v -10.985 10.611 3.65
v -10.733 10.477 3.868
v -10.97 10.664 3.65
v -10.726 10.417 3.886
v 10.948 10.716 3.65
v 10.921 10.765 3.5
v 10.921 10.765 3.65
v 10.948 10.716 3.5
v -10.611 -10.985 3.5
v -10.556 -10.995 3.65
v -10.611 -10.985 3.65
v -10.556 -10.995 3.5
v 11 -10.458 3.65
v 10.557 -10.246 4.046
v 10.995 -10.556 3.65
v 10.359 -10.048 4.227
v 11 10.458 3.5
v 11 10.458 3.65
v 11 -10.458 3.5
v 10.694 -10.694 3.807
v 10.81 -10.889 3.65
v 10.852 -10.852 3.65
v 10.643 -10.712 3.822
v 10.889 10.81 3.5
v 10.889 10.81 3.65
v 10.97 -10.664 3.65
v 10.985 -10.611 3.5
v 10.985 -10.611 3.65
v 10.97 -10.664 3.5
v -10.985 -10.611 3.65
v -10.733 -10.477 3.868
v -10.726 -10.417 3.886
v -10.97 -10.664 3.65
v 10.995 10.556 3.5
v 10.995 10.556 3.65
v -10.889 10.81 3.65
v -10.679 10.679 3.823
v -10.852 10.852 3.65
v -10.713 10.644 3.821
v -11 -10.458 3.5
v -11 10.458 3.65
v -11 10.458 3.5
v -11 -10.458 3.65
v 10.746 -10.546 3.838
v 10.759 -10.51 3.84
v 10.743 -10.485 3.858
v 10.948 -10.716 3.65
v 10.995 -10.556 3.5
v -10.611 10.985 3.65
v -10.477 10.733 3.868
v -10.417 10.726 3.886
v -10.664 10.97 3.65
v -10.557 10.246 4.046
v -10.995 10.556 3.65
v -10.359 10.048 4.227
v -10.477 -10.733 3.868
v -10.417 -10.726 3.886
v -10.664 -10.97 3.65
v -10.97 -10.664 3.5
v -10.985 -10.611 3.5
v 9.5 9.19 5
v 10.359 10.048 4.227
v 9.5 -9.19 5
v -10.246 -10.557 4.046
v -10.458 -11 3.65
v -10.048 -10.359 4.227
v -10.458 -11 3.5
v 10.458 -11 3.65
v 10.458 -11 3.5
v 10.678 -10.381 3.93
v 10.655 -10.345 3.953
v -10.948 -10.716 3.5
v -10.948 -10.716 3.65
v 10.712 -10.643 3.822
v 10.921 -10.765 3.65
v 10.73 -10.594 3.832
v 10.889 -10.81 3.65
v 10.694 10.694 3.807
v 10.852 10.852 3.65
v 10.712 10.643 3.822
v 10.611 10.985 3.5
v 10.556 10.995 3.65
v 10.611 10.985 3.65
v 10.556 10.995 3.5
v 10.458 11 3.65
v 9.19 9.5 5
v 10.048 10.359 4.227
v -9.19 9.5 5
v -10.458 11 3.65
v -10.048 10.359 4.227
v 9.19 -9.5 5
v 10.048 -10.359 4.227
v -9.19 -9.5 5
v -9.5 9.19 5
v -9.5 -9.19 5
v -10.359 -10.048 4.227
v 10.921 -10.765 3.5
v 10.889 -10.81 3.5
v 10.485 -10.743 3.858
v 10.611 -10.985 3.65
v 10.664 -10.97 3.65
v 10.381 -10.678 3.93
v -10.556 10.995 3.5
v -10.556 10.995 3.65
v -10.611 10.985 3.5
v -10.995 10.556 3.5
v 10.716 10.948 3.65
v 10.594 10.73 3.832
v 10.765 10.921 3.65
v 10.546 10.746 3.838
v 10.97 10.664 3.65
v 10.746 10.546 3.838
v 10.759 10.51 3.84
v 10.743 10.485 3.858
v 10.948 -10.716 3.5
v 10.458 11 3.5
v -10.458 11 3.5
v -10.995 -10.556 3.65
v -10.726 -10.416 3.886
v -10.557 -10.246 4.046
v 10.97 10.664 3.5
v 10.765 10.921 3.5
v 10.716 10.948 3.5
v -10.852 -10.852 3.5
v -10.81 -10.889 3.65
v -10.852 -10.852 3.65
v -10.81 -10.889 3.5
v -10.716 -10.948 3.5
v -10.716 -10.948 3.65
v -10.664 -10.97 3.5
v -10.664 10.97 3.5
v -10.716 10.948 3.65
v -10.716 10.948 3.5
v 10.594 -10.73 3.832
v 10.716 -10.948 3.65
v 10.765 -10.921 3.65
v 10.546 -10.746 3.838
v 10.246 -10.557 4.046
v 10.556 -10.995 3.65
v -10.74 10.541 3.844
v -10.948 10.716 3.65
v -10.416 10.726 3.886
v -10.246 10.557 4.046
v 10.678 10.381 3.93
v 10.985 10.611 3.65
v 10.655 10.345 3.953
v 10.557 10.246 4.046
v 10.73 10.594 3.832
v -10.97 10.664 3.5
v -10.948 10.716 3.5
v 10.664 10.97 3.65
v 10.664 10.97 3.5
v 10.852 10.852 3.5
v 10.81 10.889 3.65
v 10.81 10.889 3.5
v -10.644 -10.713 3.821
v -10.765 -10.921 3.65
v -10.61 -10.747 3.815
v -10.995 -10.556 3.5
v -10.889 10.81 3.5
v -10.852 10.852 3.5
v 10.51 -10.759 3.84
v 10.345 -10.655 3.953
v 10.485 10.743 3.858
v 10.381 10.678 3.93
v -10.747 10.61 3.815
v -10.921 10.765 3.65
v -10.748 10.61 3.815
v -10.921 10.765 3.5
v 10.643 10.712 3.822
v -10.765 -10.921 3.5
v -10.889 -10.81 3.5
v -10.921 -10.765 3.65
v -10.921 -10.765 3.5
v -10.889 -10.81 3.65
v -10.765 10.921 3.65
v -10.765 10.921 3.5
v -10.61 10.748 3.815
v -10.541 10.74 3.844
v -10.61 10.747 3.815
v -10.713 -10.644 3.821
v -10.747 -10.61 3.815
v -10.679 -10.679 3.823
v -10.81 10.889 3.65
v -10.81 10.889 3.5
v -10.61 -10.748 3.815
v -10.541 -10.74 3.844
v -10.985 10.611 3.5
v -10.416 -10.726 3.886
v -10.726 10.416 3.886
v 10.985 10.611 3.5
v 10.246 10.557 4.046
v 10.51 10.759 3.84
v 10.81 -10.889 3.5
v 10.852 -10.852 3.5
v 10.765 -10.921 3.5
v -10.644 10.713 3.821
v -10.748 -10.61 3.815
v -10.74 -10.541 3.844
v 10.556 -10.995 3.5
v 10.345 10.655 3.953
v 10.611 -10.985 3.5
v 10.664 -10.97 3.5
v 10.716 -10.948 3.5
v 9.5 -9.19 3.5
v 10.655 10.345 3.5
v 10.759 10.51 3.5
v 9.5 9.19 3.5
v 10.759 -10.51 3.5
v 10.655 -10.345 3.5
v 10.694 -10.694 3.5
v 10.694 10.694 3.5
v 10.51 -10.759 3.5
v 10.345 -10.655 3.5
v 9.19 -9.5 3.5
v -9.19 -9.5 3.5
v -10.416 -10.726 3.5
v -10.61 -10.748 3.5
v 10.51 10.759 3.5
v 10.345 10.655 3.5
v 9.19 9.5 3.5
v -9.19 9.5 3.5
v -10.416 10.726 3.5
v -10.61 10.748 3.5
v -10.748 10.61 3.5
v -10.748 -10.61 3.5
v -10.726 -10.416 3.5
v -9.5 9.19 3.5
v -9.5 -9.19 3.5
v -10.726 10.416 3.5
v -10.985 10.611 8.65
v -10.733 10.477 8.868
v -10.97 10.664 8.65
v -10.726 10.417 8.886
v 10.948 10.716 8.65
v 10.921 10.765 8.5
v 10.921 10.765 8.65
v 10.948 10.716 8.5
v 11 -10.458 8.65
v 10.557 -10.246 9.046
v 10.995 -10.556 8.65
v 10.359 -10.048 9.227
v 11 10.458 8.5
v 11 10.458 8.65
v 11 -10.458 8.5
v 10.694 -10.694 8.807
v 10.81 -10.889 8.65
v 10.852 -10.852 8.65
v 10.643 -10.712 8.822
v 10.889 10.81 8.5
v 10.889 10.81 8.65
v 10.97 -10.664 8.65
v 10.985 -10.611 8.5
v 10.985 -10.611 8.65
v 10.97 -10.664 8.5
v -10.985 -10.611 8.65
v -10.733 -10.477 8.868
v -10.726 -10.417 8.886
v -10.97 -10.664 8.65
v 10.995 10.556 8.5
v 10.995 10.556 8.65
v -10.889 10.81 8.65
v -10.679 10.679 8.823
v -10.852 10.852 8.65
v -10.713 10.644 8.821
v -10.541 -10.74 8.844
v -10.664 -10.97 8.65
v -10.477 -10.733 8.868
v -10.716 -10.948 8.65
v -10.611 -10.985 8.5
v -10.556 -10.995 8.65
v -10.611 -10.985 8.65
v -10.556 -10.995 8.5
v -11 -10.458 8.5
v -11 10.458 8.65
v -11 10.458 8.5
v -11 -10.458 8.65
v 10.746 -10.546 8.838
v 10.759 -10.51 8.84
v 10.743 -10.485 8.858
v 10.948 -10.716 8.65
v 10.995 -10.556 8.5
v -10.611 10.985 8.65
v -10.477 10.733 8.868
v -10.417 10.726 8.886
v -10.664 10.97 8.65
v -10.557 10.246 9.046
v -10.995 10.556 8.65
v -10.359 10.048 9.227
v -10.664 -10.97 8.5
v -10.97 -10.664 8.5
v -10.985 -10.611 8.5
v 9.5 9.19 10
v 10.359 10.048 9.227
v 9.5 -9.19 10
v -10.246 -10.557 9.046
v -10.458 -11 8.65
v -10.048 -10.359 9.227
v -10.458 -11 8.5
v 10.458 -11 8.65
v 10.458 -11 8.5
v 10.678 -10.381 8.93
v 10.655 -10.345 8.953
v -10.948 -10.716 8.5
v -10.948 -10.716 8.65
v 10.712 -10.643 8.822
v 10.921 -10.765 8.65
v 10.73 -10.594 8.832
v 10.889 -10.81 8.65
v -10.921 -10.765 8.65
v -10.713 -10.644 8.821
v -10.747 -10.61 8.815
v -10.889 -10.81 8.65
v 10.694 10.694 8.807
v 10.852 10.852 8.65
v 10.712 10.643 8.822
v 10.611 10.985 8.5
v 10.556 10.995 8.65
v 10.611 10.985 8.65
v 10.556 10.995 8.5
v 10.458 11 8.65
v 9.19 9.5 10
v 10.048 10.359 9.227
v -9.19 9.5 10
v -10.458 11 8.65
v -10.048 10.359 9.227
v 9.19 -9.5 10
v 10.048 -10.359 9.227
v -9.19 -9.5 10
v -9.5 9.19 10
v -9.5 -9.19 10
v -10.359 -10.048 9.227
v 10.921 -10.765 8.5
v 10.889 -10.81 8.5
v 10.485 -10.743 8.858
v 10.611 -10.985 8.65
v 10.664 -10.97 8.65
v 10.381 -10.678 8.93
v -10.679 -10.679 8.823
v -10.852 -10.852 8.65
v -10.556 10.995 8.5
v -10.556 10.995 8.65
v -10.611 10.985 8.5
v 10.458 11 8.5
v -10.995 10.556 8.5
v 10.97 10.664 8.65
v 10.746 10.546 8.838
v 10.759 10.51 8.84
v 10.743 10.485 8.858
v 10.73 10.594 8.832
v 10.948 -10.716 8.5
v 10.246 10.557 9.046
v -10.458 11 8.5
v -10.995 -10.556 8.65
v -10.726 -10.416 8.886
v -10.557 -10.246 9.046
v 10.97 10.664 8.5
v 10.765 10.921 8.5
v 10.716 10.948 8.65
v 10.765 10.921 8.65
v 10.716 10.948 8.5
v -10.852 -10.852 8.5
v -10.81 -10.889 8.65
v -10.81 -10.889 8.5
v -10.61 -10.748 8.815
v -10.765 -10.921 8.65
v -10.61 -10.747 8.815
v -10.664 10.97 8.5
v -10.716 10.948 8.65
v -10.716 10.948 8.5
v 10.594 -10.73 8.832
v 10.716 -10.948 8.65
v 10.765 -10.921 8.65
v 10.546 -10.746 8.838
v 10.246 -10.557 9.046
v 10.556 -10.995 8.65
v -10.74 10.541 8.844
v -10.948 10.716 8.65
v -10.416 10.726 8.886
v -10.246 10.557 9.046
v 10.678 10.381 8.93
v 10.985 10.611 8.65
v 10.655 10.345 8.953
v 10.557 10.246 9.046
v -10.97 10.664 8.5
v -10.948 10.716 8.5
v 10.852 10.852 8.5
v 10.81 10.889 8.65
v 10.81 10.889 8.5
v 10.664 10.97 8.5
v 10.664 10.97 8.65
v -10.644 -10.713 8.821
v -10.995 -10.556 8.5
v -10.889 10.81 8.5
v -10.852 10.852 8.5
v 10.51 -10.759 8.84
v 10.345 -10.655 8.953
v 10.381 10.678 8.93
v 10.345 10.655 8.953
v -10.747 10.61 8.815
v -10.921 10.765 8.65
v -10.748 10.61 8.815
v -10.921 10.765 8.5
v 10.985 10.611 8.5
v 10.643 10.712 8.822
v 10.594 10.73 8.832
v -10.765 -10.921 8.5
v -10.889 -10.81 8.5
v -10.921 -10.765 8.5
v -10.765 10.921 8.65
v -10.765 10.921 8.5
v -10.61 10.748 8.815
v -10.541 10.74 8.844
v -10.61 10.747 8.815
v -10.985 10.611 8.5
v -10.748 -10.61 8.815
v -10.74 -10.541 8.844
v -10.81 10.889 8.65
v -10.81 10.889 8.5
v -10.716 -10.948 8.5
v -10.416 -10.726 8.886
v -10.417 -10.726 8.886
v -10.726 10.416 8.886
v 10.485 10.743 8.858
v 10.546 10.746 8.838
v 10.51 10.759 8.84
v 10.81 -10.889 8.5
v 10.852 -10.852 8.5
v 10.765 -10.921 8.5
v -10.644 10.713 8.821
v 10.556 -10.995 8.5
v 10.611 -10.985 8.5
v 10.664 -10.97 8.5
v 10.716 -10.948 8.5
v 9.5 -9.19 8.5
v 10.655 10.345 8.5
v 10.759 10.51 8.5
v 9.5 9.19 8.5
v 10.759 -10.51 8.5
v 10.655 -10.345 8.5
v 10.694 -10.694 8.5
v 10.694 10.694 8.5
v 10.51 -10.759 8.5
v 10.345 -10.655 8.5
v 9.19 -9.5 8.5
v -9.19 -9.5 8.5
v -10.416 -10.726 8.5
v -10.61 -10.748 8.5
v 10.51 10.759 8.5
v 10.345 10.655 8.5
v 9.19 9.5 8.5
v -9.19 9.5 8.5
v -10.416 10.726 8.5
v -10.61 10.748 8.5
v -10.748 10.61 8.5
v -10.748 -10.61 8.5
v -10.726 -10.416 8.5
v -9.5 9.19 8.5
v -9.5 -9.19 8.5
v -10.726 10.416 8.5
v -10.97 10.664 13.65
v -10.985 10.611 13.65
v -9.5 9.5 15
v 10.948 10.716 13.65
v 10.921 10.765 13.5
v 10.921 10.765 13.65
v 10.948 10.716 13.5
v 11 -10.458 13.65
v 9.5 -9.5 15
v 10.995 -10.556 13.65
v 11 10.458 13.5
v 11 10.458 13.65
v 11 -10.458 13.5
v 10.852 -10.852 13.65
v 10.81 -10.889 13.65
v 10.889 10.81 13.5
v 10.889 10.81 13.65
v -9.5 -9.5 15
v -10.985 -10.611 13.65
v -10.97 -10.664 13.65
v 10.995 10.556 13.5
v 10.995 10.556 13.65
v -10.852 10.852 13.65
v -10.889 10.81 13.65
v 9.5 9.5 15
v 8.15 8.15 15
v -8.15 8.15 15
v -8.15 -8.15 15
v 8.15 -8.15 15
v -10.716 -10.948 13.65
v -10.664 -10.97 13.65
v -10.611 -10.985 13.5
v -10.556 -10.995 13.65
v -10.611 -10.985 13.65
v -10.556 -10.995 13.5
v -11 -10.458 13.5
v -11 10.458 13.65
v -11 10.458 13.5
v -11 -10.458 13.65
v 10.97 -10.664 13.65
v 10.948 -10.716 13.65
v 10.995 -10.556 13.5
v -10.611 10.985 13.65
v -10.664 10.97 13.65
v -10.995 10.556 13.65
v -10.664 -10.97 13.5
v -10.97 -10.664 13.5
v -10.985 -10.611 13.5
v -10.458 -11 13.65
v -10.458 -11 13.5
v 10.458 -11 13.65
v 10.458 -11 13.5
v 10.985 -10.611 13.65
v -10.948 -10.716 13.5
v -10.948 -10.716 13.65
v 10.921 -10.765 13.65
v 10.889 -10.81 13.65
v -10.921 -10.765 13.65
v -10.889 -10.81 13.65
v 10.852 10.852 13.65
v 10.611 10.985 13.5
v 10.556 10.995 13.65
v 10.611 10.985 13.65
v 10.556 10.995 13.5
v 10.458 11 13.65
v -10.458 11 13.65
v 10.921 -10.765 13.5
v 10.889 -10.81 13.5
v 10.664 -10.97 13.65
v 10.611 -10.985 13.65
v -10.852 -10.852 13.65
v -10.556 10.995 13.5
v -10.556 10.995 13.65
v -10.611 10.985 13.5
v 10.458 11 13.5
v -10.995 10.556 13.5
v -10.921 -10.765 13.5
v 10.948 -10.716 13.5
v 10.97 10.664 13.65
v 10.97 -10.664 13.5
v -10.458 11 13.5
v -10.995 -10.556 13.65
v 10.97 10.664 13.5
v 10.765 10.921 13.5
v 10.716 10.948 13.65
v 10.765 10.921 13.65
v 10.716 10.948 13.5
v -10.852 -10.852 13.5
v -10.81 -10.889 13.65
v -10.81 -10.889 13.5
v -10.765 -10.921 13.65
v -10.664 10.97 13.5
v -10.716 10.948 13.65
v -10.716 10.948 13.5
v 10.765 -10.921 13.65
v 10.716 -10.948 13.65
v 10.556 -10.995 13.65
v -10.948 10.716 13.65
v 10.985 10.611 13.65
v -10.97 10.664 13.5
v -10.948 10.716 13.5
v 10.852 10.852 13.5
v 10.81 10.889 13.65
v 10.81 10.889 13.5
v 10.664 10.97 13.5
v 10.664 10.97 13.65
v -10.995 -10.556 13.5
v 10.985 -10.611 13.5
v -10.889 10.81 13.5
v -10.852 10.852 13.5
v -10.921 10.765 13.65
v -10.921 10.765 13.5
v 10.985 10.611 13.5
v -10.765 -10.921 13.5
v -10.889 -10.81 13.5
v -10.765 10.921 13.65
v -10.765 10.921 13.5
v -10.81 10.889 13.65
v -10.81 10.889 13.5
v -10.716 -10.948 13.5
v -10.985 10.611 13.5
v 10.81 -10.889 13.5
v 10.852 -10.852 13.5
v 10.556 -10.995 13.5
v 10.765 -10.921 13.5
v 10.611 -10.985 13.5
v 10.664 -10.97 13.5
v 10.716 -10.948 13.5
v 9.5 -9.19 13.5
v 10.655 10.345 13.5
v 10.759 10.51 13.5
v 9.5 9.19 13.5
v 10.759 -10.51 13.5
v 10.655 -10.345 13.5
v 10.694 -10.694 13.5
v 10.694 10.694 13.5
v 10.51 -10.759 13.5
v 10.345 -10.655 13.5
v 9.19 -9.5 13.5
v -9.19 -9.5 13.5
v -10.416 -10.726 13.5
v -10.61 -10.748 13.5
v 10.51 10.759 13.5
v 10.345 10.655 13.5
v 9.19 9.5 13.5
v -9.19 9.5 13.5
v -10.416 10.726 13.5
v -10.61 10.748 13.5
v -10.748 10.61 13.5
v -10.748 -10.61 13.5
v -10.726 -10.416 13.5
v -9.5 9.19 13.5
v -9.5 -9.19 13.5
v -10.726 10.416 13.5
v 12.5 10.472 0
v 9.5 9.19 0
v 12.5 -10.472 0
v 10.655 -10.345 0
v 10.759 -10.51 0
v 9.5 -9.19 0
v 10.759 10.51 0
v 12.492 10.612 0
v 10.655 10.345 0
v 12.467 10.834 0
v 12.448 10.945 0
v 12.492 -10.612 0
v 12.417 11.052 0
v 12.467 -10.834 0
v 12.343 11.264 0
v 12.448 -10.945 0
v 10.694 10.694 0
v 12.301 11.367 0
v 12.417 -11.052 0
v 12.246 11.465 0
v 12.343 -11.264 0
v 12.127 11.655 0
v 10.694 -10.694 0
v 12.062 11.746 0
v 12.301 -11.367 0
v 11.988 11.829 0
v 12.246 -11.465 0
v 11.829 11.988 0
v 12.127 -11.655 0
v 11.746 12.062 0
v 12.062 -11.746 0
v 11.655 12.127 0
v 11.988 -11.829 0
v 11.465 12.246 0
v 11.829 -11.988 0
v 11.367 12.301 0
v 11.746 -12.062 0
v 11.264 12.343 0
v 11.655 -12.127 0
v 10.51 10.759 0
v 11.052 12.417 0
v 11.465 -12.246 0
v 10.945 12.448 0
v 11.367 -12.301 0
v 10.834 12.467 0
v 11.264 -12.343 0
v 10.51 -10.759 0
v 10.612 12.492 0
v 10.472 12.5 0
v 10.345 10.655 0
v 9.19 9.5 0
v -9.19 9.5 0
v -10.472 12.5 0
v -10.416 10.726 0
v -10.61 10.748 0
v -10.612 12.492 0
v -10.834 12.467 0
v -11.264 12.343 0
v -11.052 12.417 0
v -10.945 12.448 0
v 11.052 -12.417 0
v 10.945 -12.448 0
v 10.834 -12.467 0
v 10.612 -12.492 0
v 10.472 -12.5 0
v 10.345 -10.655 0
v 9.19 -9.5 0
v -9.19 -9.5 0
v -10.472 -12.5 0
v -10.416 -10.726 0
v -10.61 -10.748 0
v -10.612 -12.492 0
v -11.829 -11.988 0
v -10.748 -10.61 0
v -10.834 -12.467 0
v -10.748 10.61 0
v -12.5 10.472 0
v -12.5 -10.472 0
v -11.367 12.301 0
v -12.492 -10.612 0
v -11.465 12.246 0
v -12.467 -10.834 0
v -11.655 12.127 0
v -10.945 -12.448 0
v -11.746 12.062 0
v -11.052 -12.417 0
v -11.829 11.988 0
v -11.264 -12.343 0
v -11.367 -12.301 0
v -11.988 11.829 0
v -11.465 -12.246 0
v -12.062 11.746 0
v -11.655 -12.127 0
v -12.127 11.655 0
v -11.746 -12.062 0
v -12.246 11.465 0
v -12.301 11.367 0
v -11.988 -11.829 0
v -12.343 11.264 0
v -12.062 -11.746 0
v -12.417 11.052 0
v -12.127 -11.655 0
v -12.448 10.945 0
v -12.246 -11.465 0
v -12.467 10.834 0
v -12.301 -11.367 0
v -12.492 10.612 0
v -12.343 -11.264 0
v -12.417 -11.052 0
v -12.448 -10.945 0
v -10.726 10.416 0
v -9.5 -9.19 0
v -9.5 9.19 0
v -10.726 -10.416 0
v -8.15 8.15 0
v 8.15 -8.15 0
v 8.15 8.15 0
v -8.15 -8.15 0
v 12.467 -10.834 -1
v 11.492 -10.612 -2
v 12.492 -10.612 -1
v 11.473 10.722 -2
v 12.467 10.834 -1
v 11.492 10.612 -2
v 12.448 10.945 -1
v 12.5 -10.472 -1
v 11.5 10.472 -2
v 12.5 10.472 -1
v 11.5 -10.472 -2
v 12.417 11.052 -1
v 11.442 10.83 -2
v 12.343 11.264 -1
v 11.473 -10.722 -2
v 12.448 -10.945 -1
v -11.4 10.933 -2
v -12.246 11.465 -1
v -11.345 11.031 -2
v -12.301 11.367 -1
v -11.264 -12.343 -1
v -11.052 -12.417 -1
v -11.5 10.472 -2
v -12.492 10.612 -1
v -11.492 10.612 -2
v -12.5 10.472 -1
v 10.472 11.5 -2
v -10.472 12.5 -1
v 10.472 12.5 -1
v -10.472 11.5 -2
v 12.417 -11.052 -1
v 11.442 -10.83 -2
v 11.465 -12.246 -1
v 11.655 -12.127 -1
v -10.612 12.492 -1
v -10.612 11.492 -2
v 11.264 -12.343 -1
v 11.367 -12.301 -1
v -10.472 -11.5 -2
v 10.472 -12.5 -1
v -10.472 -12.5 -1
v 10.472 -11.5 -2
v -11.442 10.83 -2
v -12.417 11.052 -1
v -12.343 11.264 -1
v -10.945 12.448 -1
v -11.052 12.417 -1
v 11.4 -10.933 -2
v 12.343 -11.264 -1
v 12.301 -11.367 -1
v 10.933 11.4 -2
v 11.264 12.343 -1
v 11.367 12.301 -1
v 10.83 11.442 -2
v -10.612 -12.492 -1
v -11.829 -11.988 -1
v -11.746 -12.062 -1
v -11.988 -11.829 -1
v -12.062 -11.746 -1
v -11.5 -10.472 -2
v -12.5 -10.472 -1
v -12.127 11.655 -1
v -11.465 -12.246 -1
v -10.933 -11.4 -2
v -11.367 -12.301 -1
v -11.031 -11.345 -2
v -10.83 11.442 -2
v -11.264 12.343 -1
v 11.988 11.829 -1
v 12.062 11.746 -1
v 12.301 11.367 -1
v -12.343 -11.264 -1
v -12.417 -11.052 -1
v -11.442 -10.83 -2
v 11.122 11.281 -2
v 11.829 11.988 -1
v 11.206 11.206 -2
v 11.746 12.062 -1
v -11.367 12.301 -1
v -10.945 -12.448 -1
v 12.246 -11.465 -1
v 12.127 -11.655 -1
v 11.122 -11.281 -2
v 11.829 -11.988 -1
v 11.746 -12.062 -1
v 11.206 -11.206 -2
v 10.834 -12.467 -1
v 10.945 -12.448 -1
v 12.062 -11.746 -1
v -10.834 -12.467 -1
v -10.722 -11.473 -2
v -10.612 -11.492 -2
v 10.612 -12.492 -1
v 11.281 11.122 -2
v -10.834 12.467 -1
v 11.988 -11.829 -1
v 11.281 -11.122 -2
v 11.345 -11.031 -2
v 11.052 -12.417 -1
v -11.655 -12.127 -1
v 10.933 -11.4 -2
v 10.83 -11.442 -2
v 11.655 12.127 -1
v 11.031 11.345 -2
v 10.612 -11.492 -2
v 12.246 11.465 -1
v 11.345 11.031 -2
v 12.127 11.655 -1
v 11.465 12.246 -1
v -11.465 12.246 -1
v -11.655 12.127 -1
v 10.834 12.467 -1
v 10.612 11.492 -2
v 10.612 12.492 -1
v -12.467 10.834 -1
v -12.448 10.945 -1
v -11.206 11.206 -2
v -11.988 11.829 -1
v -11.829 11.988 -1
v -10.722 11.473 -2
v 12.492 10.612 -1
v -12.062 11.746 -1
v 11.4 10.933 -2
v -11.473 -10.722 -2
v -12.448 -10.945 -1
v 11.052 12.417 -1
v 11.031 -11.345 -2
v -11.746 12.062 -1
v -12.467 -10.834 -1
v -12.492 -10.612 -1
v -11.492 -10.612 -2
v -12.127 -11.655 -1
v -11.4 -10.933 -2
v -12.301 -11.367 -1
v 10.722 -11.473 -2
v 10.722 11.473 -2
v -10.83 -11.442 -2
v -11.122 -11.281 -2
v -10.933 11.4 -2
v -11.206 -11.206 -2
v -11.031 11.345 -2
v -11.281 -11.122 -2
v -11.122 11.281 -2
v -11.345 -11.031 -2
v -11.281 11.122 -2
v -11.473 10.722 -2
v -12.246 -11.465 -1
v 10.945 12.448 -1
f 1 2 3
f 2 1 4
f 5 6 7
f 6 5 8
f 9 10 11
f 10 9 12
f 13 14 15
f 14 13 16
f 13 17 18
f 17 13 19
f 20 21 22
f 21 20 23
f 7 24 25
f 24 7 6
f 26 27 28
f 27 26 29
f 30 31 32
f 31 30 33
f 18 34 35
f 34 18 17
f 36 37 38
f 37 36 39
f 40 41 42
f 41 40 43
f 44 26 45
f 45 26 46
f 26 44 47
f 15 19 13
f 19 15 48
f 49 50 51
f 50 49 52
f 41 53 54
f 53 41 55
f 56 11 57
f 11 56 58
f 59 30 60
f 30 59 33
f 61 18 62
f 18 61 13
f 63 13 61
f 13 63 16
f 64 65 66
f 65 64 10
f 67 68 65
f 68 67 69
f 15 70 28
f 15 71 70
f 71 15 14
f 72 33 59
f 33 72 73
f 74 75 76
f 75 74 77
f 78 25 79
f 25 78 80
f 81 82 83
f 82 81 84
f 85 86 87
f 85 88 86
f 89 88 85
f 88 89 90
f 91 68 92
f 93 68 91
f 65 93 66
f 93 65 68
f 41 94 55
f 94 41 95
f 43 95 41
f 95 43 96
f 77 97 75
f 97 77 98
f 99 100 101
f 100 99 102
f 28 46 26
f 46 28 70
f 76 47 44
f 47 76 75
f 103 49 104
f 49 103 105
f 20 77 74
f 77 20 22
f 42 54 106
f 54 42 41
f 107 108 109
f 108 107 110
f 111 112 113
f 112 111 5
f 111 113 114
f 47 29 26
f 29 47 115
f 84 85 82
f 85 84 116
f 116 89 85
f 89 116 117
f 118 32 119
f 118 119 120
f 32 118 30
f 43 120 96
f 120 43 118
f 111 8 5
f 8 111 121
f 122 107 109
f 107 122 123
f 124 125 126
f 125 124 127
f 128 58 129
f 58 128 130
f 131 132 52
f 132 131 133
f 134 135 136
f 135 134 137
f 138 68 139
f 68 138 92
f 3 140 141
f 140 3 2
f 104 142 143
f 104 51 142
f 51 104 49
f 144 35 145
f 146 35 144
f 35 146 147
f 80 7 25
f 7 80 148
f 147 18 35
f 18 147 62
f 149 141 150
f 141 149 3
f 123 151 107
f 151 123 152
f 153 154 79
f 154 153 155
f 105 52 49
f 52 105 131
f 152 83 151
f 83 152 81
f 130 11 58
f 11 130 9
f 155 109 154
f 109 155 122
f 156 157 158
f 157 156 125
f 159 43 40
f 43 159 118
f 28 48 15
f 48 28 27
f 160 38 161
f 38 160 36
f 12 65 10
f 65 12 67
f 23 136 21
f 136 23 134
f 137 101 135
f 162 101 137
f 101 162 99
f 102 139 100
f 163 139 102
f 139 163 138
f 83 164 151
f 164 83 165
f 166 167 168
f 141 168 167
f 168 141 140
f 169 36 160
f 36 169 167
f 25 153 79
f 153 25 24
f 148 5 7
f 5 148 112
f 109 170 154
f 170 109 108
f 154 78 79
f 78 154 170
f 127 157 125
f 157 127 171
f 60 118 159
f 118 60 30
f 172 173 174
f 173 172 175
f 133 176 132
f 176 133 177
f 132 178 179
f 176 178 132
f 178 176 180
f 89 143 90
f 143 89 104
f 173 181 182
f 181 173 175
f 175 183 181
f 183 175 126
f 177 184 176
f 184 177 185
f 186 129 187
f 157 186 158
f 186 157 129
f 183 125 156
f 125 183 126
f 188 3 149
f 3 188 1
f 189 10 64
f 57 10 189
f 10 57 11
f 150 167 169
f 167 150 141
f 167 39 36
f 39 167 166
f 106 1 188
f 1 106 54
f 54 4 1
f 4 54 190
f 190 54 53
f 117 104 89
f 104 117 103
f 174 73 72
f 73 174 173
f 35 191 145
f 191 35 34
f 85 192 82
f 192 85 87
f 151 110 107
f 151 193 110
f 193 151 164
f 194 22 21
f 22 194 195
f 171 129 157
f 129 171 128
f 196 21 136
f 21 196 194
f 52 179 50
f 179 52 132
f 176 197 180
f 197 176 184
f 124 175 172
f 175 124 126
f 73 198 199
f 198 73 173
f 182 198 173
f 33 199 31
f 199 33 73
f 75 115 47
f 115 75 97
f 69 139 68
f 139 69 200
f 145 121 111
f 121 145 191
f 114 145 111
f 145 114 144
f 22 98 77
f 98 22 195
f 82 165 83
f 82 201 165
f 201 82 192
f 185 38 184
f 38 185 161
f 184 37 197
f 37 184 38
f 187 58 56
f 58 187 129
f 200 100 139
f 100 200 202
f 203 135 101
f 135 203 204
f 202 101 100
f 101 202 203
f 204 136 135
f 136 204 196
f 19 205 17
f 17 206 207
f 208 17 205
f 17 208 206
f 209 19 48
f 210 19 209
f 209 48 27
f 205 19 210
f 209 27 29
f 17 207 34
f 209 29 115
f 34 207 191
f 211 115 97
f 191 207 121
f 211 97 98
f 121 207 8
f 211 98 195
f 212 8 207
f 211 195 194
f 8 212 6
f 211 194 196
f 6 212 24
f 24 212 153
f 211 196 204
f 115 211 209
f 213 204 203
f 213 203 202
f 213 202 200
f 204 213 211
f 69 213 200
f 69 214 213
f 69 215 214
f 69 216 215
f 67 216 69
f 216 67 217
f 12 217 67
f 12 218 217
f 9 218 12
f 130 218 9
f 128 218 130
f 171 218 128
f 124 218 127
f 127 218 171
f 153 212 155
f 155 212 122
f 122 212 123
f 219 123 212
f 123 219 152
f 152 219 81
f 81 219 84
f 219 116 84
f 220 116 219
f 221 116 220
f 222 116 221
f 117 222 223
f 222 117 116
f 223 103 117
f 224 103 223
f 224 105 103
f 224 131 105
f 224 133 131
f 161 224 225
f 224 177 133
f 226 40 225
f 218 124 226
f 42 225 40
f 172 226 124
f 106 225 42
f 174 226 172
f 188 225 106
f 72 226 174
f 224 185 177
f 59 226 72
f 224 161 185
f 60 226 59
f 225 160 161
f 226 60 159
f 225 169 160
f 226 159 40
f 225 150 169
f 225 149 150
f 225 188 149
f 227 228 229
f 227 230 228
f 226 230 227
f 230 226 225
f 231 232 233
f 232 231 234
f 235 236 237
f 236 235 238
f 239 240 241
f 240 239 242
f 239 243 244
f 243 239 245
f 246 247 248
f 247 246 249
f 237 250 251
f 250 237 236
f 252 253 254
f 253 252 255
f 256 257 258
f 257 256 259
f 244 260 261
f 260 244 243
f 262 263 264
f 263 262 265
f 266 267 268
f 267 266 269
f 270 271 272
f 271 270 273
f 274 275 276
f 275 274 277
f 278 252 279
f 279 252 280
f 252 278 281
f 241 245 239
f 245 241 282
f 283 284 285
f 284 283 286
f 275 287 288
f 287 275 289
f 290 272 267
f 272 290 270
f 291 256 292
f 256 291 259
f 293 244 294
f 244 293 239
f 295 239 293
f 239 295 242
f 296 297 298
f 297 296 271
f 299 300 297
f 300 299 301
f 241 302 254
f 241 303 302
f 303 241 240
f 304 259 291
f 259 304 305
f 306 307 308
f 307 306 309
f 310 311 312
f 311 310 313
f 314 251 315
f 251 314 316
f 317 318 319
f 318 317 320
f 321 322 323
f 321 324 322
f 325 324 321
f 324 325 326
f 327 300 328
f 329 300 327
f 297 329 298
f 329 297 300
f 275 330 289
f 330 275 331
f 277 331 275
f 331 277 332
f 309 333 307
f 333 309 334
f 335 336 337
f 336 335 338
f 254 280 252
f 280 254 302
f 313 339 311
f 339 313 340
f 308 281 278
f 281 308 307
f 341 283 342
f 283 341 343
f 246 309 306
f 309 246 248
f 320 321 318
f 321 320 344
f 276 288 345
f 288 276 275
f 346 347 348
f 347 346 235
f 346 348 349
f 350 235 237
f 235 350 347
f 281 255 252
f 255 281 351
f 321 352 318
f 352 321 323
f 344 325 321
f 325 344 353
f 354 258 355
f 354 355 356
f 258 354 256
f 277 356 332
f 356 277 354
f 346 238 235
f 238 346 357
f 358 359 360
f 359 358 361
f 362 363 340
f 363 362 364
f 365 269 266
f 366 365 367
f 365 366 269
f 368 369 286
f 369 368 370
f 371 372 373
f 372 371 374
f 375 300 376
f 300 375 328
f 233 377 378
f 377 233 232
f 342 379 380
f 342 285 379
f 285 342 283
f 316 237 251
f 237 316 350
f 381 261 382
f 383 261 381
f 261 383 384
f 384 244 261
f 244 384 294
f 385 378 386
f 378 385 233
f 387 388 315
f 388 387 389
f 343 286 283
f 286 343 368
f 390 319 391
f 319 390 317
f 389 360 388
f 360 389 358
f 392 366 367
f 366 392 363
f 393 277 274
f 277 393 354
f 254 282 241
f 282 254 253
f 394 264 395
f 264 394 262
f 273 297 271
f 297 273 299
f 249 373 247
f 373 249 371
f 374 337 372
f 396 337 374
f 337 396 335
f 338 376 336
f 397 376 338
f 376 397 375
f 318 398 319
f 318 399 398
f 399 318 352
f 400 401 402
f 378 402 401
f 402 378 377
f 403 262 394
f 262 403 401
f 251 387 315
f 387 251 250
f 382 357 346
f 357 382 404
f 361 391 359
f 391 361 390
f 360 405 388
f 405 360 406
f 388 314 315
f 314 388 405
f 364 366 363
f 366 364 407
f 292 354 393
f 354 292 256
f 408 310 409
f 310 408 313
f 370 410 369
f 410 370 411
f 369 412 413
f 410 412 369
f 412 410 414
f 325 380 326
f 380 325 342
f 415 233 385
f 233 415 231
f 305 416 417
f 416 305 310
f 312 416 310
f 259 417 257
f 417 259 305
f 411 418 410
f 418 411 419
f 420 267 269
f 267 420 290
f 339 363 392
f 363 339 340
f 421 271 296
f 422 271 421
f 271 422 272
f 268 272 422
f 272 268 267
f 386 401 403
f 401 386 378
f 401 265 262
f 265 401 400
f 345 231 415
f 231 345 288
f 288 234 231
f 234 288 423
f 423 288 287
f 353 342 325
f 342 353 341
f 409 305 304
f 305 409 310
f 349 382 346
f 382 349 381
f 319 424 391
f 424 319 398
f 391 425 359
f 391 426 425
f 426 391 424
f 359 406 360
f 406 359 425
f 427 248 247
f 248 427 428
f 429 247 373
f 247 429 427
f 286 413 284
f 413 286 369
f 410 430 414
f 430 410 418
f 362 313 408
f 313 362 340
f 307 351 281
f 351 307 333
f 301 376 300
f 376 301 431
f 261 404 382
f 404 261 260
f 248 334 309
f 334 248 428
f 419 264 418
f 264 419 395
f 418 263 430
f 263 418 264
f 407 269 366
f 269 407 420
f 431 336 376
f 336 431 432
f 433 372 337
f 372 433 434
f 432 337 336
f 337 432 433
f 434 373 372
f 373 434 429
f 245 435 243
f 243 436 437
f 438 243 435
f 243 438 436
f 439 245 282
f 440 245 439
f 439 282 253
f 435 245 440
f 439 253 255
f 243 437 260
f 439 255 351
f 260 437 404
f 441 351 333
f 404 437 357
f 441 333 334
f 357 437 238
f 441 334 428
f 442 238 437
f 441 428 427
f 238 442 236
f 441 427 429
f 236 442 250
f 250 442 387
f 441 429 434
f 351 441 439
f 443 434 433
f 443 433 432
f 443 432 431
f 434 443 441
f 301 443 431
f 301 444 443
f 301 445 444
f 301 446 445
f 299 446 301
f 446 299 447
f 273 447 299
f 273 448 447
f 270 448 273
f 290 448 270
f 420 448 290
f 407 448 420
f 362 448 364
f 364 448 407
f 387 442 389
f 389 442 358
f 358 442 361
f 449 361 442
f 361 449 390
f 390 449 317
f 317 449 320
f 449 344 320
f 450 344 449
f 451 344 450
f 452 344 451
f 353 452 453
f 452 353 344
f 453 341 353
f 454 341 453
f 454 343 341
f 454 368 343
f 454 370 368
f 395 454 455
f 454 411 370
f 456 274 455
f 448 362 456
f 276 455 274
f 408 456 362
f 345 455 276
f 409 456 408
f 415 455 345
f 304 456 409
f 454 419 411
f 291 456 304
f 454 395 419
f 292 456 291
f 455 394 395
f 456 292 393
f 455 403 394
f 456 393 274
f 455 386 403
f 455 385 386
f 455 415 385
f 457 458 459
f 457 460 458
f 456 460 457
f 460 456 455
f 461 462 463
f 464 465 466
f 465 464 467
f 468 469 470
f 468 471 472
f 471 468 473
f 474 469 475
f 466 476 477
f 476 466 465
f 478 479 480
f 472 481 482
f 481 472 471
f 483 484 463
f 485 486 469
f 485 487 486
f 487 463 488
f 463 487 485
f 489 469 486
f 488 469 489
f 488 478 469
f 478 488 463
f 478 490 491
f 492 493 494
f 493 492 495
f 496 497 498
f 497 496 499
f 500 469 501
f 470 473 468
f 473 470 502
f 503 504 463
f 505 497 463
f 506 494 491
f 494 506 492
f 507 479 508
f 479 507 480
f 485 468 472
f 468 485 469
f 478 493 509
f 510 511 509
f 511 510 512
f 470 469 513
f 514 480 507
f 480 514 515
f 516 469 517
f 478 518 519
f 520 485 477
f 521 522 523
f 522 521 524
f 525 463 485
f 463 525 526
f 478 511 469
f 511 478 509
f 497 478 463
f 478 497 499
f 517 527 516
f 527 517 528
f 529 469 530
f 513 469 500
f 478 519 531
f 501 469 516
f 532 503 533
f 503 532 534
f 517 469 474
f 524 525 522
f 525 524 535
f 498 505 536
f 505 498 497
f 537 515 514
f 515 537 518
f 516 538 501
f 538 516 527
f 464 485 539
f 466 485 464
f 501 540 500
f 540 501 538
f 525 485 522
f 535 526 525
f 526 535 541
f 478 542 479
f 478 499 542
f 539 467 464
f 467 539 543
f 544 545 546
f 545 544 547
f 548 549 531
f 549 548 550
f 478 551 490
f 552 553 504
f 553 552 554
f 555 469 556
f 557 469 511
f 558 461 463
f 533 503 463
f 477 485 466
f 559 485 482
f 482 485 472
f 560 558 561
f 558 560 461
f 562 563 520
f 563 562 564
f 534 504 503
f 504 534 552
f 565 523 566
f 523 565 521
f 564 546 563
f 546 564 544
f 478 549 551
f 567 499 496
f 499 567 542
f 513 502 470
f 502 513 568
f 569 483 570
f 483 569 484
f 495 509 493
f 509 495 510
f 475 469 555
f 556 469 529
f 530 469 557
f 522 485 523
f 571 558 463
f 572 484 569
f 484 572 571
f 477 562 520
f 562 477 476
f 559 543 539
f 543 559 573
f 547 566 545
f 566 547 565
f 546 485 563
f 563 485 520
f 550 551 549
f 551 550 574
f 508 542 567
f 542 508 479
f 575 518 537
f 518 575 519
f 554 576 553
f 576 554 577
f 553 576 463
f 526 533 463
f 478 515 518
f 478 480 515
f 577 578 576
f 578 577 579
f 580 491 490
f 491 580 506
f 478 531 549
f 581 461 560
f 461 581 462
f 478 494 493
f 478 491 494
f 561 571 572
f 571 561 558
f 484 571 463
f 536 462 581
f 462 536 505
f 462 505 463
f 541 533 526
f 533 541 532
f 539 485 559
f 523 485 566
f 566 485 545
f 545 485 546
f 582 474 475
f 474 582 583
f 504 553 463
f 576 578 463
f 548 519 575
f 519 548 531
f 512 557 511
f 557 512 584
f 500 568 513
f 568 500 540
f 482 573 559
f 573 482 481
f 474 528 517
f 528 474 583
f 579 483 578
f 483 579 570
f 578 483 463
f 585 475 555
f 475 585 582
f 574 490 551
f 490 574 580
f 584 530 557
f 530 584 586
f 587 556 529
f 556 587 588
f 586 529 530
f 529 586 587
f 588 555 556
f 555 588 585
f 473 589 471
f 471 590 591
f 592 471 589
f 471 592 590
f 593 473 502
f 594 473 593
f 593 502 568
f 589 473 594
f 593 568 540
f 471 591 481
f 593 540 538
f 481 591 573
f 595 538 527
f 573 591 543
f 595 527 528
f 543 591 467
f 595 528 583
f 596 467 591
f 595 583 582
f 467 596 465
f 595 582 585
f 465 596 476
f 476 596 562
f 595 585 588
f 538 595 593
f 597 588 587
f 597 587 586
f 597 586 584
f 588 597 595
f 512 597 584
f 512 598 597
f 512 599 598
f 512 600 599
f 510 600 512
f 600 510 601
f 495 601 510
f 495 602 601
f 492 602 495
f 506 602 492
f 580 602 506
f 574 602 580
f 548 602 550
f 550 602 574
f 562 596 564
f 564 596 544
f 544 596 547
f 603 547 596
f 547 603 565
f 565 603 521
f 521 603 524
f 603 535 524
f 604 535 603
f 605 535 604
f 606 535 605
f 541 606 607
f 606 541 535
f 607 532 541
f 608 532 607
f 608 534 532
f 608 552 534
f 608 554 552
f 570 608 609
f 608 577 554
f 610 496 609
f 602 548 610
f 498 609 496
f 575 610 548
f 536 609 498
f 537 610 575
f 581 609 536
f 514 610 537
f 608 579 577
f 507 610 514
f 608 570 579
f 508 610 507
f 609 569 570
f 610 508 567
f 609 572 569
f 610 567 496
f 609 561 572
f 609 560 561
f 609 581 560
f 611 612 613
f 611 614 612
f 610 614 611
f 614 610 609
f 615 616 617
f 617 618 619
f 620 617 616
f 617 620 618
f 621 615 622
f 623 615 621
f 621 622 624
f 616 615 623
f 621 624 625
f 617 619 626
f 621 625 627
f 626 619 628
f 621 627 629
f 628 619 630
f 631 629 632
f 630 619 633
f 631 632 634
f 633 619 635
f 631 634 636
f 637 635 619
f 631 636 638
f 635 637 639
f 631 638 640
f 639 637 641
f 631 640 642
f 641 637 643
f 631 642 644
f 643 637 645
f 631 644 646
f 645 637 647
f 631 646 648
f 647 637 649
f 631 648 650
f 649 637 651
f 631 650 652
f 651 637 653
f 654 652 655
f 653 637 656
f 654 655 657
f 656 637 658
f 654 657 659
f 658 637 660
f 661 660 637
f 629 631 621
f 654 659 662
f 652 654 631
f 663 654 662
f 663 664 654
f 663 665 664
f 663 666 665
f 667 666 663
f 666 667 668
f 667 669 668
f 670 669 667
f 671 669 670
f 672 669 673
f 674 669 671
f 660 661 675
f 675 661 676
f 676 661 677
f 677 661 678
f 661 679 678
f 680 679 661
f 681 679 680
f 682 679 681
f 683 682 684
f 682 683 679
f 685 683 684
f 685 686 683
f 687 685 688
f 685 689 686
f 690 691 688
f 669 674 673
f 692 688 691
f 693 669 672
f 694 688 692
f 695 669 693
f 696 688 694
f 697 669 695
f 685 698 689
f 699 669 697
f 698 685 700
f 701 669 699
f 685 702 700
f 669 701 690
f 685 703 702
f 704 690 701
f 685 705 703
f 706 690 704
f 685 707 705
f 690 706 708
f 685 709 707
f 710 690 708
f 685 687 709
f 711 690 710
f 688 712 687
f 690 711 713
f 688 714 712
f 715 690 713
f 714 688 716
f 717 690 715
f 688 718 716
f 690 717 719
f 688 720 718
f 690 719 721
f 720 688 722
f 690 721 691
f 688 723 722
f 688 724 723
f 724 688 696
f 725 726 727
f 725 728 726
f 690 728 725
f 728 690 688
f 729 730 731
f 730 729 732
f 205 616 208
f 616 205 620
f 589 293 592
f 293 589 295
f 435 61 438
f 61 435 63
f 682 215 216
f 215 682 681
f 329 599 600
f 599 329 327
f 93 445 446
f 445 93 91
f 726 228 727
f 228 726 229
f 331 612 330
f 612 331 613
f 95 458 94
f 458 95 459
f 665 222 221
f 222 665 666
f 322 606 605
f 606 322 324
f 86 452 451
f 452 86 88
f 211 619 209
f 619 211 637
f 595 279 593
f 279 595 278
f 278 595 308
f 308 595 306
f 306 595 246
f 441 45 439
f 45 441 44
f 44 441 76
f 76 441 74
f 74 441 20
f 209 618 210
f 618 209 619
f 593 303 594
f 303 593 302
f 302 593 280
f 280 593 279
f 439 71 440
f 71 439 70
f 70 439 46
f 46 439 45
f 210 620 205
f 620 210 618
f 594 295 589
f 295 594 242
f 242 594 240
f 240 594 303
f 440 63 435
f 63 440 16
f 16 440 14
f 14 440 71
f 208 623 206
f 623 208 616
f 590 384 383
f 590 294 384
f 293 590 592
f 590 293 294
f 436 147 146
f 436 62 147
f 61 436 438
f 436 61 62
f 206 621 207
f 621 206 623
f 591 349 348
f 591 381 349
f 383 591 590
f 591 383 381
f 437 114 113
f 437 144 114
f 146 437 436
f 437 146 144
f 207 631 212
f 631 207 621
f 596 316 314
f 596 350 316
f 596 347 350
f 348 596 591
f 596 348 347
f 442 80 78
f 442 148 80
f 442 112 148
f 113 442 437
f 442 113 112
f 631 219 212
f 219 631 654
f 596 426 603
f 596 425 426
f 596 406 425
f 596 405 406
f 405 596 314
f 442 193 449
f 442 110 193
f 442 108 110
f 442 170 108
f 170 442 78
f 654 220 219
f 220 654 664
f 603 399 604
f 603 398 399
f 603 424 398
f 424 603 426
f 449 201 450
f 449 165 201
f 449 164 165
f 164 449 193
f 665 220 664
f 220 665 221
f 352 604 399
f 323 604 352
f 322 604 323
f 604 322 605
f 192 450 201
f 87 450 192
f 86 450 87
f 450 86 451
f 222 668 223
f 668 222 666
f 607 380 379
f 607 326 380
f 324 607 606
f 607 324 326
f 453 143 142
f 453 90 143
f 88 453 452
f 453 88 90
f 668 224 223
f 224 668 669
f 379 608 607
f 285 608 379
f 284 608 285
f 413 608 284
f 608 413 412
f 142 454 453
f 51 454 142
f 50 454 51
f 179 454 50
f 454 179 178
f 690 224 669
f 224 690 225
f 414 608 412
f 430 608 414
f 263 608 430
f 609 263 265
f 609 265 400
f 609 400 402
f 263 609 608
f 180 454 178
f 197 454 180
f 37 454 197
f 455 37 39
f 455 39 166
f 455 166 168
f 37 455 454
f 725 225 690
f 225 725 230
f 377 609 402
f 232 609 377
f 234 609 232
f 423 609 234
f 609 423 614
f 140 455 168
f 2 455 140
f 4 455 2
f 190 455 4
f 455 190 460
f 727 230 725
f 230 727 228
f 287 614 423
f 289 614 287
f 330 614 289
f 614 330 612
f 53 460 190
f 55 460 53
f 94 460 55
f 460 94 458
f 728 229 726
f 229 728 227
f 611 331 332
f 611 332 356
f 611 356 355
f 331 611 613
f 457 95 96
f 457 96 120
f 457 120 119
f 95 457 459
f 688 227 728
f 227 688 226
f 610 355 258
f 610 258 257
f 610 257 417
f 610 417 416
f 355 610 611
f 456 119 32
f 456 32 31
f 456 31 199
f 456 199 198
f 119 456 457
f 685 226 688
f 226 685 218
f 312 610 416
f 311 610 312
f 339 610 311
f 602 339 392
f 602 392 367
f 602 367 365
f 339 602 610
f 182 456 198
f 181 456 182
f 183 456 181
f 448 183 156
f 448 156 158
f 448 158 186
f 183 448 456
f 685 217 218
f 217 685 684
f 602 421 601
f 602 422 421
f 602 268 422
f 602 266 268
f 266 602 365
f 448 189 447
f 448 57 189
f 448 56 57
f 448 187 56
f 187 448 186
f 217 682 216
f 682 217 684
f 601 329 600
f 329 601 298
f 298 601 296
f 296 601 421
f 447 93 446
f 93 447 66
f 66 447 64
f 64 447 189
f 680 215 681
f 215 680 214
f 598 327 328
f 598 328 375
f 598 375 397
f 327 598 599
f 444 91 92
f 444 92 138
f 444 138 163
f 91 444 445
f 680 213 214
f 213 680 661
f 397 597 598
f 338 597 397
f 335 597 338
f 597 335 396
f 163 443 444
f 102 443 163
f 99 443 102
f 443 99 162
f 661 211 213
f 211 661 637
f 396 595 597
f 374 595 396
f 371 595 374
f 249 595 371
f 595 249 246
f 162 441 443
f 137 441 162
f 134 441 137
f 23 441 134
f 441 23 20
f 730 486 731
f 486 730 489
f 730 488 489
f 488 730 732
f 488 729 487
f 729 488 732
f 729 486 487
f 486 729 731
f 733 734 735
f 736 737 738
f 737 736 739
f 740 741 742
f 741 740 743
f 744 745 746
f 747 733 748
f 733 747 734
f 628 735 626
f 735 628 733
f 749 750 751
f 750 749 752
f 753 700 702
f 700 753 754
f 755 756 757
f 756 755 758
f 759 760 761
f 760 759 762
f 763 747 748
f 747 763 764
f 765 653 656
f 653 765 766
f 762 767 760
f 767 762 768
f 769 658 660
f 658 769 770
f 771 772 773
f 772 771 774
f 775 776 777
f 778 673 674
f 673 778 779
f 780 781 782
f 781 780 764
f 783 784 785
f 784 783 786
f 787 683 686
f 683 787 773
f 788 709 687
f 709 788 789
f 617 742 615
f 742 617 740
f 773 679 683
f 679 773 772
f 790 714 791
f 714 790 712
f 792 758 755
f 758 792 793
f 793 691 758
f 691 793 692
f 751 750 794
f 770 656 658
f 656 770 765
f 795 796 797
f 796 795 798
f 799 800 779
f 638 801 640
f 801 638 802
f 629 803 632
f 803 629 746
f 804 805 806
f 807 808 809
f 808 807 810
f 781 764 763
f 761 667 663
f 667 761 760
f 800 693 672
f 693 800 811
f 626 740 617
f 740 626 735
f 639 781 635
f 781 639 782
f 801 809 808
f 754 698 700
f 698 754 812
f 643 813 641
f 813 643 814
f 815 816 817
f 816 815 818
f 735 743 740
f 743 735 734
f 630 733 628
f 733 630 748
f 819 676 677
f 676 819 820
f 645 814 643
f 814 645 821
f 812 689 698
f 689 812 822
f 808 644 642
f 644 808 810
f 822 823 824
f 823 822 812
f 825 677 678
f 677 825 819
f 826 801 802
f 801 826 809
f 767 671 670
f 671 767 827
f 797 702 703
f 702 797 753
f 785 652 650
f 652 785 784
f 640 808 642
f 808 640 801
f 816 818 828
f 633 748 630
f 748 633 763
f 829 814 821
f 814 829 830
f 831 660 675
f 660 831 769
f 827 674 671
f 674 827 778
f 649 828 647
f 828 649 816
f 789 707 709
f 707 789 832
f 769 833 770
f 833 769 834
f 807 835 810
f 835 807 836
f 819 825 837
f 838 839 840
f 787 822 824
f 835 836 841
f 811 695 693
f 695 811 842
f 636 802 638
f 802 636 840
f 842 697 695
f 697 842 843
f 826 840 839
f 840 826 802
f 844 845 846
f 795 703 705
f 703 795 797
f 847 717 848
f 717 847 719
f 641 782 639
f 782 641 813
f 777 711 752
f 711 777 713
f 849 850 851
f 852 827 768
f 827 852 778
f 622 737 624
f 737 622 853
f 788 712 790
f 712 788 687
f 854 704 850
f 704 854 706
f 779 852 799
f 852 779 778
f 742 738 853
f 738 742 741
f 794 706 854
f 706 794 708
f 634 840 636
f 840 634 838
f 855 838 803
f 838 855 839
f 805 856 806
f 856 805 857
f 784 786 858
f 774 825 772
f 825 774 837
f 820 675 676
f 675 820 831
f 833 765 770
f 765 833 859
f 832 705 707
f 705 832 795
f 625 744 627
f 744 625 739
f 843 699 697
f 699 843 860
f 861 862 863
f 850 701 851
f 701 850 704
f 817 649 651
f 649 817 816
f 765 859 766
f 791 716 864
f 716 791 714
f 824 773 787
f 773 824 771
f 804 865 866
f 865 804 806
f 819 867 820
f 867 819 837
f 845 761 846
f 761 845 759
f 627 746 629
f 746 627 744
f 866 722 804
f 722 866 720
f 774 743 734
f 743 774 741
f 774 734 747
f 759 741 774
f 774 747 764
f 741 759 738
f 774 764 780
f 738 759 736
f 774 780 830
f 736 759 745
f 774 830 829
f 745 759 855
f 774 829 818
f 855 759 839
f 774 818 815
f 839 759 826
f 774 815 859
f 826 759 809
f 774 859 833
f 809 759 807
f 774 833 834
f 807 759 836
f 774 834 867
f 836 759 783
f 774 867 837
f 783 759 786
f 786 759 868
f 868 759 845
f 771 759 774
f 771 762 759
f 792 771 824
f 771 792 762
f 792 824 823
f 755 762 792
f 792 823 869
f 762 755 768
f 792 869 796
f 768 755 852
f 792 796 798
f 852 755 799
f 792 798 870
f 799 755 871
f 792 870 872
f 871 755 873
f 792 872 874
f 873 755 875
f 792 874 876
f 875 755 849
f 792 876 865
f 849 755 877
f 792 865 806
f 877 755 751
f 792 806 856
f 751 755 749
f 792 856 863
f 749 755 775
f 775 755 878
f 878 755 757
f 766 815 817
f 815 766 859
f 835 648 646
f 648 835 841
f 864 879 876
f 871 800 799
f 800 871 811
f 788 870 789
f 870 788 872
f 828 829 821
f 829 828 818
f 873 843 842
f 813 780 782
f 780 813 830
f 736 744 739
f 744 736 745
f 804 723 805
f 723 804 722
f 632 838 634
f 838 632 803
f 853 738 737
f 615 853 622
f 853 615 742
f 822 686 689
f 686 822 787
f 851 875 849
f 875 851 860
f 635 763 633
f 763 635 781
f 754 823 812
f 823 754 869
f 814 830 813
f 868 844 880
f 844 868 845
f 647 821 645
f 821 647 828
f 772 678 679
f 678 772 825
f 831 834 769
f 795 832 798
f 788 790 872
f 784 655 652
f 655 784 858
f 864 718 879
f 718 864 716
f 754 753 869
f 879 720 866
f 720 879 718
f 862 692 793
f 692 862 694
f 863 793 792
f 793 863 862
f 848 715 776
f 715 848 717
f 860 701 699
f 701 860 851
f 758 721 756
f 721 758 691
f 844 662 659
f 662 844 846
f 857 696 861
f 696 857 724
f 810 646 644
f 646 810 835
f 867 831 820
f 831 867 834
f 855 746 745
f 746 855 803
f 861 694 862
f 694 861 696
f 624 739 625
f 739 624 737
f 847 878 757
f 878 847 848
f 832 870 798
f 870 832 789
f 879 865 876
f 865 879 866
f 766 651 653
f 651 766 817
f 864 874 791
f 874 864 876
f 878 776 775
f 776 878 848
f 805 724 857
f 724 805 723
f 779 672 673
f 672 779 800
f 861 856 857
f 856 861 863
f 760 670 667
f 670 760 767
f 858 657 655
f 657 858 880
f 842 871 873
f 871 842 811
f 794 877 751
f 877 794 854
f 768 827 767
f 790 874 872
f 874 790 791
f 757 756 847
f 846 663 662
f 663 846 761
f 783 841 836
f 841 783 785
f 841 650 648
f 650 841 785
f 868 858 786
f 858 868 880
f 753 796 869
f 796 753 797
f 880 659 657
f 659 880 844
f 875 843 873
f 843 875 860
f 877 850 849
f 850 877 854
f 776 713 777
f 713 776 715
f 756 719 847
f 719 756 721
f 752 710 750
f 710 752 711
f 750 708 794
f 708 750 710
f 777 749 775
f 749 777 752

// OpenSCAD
// file: common.scad
include <../../globals.scad>;

module line(l) {
    assert(l >= EXTRUSION_WIDTH);
    
    distance = l - EXTRUSION_WIDTH;
    r = EXTRUSION_WIDTH / 2;
    hull() {
        translate([-distance/2, 0]) circle(r=r);
        translate([distance/2, 0]) circle(r=r);
    }
}

module make_face_plate(height, chamfer_pct=0.5) {
    
    assert(! is_undef(height));
    
    unchamfered_height = height * (1 - chamfer_pct);
    chamfered_height = height * chamfer_pct;
    
    minkowski() {
        linear_extrude(unchamfered_height)
        offset(delta=-chamfered_height) children(0);
        
        cylinder(chamfered_height, r2=chamfered_height, r1=0);
    }
}

// Requires a 2d sketch of the shape outline
// A second shape with supports may be given
module make_anchors(height, n) {
    
    anchor_height = nearest_layer_height(1.5);
    
    module anchor() {
        hull() {
            linear_extrude(LAYER_HEIGHT)
            children(0);
            
            linear_extrude(anchor_height)
            offset(delta=-anchor_height)
            children(0);
        }
    }
    
    assert(! is_undef(height));
    assert($children <= 2);
    assert($children >= 1);
    
    n = default(n, round(height/5));

    difference() {
        union() {
            // the anchors
            step = height / n;
            for(i=[1:n]) {
                translate([0,0,i * step - anchor_height])
                anchor() children(0);
            }
            
            // the base
            linear_extrude(height)
            offset(delta=-anchor_height)
            children(0);
            
            // anchor supports
            if($children == 2) {
                // the base
                linear_extrude(height - anchor_height)
                children(1);
            }
        }
        // the base cutout
        translate([0,0,-EPS])
        linear_extrude(height + 2 * EPS)
        offset(delta=-anchor_height-WALL_XS)
        children(0);
    }
}
// file: ../../globals.scad
//$fa = $preview? 12 : 6;
//$fs = $preview? 2 : 0.2;

EPS = 1/64;

// Used for indexing coordinates since the dot syntax is not
// officialy supported
X = 0;
Y = 1;
Z = 2;

// Slicer defaults
LAYER_HEIGHT = 0.15;
EXTRUSION_WIDTH = 0.45;

function nearest_layer_height(n) = round(n / LAYER_HEIGHT) * LAYER_HEIGHT;
function nearest_extrusion_width(n) = round(n / EXTRUSION_WIDTH) * EXTRUSION_WIDTH;

// Defaults for all parts
WALL_XS = nearest_extrusion_width(1.25);
WALL_S = nearest_extrusion_width(2);
WALL = nearest_extrusion_width(3);
WALL_L = nearest_extrusion_width(5);
WALL_XL = nearest_extrusion_width(7.5);

// Seems to be a good middle ground, corresponds to #8 for imperial ones
SCREW = 4;

// Set up OpenSCAD rendering defaults
$fa = 6;
$fs = EXTRUSION_WIDTH / 2;

function default(v, d) = is_undef(v)? d : v;

// For engraving in all planes except those parrallel to XY.
module v_engrave(t, size=10) {
    translate([0, 0.3, 0])
    rotate([90,0,0])
    linear_extrude(0.3 + EPS)
    text(t, size=size, font="DejaVu Sans:style=Book", valign="center", halign="center", $fn=8);
}

// For engraving in all planes parrallel to XY.
module h_engrave(t, size=10) {
    translate([0, 0, -0.7])
    linear_extrude(0.7 + EPS)
    text(t, size=size, font="DejaVu Sans:style=Book", valign="center", halign="center", $fn=8);
}

// Used for creating screw holes
module screw(height, head_extra_height=0) {
    translate([0,0, -(height + head_extra_height) / 2]) {
        cylinder(height, r=SCREW/2);
        
        translate([0,0,height-SCREW/2])
        cylinder(SCREW/2, r1=SCREW/2, r2=SCREW);
        
        translate([0,0,height - EPS])
        cylinder(head_extra_height + EPS, r=SCREW);
    }
}
// main file
// Height and width of the tube
W = 25;

// Thickness of the walls of the tube
T = 1.5;

// Radius of the fillet
F =2;

// Thickness of the face plate
P = 2;

// Height of the snap-in anchors
A = 15;

include <../../globals.scad>
use <../../dim.scad>

use <common.scad>

module plug_square(tube_size, tube_thickness, fillet_radius, face_plate_thickness=2, anchors_height=15) {
    anchor_radius = max(fillet_radius - tube_thickness,0);
    anchor_supports_length = sqrt(2) * (tube_size - 2 * (tube_thickness + anchor_radius))
                           + 2 * anchor_radius
                           - EXTRUSION_WIDTH; // Inset the support just a little

    module square_profile_sketch() {
        offset(r=fillet_radius)
        offset(delta=-fillet_radius)
        square(tube_size, center=true);
    }

    make_anchors(anchors_height) {
        offset(delta=-tube_thickness)
        square_profile_sketch();

        // use bridges instead of support
        // so reinforce the corners
        union() {
            rotate(45)
            line(anchor_supports_length);

            rotate(-45)
            line(anchor_supports_length);
        }
    }

    translate([0,0,-face_plate_thickness])
    make_face_plate(face_plate_thickness) square_profile_sketch();
}

// Actual object
plug_square(W, T, F, P, A);

// Documentation
translate([0,-W/2])
dim_x(W, "W", F);

translate([W/2,0]) {
    dim_y(W, "W", F);
    
    translate([0, -(W-T)/2])
    dim_y(T, "T", T + dim_text_line(1));
}

translate([-W/2,0, (A+P)/2 -P])
dim_z(A + P, undef, T);

translate([-W/2+F,-W/2+F])
dim_xy_radius(F, "F", theta=-135);
